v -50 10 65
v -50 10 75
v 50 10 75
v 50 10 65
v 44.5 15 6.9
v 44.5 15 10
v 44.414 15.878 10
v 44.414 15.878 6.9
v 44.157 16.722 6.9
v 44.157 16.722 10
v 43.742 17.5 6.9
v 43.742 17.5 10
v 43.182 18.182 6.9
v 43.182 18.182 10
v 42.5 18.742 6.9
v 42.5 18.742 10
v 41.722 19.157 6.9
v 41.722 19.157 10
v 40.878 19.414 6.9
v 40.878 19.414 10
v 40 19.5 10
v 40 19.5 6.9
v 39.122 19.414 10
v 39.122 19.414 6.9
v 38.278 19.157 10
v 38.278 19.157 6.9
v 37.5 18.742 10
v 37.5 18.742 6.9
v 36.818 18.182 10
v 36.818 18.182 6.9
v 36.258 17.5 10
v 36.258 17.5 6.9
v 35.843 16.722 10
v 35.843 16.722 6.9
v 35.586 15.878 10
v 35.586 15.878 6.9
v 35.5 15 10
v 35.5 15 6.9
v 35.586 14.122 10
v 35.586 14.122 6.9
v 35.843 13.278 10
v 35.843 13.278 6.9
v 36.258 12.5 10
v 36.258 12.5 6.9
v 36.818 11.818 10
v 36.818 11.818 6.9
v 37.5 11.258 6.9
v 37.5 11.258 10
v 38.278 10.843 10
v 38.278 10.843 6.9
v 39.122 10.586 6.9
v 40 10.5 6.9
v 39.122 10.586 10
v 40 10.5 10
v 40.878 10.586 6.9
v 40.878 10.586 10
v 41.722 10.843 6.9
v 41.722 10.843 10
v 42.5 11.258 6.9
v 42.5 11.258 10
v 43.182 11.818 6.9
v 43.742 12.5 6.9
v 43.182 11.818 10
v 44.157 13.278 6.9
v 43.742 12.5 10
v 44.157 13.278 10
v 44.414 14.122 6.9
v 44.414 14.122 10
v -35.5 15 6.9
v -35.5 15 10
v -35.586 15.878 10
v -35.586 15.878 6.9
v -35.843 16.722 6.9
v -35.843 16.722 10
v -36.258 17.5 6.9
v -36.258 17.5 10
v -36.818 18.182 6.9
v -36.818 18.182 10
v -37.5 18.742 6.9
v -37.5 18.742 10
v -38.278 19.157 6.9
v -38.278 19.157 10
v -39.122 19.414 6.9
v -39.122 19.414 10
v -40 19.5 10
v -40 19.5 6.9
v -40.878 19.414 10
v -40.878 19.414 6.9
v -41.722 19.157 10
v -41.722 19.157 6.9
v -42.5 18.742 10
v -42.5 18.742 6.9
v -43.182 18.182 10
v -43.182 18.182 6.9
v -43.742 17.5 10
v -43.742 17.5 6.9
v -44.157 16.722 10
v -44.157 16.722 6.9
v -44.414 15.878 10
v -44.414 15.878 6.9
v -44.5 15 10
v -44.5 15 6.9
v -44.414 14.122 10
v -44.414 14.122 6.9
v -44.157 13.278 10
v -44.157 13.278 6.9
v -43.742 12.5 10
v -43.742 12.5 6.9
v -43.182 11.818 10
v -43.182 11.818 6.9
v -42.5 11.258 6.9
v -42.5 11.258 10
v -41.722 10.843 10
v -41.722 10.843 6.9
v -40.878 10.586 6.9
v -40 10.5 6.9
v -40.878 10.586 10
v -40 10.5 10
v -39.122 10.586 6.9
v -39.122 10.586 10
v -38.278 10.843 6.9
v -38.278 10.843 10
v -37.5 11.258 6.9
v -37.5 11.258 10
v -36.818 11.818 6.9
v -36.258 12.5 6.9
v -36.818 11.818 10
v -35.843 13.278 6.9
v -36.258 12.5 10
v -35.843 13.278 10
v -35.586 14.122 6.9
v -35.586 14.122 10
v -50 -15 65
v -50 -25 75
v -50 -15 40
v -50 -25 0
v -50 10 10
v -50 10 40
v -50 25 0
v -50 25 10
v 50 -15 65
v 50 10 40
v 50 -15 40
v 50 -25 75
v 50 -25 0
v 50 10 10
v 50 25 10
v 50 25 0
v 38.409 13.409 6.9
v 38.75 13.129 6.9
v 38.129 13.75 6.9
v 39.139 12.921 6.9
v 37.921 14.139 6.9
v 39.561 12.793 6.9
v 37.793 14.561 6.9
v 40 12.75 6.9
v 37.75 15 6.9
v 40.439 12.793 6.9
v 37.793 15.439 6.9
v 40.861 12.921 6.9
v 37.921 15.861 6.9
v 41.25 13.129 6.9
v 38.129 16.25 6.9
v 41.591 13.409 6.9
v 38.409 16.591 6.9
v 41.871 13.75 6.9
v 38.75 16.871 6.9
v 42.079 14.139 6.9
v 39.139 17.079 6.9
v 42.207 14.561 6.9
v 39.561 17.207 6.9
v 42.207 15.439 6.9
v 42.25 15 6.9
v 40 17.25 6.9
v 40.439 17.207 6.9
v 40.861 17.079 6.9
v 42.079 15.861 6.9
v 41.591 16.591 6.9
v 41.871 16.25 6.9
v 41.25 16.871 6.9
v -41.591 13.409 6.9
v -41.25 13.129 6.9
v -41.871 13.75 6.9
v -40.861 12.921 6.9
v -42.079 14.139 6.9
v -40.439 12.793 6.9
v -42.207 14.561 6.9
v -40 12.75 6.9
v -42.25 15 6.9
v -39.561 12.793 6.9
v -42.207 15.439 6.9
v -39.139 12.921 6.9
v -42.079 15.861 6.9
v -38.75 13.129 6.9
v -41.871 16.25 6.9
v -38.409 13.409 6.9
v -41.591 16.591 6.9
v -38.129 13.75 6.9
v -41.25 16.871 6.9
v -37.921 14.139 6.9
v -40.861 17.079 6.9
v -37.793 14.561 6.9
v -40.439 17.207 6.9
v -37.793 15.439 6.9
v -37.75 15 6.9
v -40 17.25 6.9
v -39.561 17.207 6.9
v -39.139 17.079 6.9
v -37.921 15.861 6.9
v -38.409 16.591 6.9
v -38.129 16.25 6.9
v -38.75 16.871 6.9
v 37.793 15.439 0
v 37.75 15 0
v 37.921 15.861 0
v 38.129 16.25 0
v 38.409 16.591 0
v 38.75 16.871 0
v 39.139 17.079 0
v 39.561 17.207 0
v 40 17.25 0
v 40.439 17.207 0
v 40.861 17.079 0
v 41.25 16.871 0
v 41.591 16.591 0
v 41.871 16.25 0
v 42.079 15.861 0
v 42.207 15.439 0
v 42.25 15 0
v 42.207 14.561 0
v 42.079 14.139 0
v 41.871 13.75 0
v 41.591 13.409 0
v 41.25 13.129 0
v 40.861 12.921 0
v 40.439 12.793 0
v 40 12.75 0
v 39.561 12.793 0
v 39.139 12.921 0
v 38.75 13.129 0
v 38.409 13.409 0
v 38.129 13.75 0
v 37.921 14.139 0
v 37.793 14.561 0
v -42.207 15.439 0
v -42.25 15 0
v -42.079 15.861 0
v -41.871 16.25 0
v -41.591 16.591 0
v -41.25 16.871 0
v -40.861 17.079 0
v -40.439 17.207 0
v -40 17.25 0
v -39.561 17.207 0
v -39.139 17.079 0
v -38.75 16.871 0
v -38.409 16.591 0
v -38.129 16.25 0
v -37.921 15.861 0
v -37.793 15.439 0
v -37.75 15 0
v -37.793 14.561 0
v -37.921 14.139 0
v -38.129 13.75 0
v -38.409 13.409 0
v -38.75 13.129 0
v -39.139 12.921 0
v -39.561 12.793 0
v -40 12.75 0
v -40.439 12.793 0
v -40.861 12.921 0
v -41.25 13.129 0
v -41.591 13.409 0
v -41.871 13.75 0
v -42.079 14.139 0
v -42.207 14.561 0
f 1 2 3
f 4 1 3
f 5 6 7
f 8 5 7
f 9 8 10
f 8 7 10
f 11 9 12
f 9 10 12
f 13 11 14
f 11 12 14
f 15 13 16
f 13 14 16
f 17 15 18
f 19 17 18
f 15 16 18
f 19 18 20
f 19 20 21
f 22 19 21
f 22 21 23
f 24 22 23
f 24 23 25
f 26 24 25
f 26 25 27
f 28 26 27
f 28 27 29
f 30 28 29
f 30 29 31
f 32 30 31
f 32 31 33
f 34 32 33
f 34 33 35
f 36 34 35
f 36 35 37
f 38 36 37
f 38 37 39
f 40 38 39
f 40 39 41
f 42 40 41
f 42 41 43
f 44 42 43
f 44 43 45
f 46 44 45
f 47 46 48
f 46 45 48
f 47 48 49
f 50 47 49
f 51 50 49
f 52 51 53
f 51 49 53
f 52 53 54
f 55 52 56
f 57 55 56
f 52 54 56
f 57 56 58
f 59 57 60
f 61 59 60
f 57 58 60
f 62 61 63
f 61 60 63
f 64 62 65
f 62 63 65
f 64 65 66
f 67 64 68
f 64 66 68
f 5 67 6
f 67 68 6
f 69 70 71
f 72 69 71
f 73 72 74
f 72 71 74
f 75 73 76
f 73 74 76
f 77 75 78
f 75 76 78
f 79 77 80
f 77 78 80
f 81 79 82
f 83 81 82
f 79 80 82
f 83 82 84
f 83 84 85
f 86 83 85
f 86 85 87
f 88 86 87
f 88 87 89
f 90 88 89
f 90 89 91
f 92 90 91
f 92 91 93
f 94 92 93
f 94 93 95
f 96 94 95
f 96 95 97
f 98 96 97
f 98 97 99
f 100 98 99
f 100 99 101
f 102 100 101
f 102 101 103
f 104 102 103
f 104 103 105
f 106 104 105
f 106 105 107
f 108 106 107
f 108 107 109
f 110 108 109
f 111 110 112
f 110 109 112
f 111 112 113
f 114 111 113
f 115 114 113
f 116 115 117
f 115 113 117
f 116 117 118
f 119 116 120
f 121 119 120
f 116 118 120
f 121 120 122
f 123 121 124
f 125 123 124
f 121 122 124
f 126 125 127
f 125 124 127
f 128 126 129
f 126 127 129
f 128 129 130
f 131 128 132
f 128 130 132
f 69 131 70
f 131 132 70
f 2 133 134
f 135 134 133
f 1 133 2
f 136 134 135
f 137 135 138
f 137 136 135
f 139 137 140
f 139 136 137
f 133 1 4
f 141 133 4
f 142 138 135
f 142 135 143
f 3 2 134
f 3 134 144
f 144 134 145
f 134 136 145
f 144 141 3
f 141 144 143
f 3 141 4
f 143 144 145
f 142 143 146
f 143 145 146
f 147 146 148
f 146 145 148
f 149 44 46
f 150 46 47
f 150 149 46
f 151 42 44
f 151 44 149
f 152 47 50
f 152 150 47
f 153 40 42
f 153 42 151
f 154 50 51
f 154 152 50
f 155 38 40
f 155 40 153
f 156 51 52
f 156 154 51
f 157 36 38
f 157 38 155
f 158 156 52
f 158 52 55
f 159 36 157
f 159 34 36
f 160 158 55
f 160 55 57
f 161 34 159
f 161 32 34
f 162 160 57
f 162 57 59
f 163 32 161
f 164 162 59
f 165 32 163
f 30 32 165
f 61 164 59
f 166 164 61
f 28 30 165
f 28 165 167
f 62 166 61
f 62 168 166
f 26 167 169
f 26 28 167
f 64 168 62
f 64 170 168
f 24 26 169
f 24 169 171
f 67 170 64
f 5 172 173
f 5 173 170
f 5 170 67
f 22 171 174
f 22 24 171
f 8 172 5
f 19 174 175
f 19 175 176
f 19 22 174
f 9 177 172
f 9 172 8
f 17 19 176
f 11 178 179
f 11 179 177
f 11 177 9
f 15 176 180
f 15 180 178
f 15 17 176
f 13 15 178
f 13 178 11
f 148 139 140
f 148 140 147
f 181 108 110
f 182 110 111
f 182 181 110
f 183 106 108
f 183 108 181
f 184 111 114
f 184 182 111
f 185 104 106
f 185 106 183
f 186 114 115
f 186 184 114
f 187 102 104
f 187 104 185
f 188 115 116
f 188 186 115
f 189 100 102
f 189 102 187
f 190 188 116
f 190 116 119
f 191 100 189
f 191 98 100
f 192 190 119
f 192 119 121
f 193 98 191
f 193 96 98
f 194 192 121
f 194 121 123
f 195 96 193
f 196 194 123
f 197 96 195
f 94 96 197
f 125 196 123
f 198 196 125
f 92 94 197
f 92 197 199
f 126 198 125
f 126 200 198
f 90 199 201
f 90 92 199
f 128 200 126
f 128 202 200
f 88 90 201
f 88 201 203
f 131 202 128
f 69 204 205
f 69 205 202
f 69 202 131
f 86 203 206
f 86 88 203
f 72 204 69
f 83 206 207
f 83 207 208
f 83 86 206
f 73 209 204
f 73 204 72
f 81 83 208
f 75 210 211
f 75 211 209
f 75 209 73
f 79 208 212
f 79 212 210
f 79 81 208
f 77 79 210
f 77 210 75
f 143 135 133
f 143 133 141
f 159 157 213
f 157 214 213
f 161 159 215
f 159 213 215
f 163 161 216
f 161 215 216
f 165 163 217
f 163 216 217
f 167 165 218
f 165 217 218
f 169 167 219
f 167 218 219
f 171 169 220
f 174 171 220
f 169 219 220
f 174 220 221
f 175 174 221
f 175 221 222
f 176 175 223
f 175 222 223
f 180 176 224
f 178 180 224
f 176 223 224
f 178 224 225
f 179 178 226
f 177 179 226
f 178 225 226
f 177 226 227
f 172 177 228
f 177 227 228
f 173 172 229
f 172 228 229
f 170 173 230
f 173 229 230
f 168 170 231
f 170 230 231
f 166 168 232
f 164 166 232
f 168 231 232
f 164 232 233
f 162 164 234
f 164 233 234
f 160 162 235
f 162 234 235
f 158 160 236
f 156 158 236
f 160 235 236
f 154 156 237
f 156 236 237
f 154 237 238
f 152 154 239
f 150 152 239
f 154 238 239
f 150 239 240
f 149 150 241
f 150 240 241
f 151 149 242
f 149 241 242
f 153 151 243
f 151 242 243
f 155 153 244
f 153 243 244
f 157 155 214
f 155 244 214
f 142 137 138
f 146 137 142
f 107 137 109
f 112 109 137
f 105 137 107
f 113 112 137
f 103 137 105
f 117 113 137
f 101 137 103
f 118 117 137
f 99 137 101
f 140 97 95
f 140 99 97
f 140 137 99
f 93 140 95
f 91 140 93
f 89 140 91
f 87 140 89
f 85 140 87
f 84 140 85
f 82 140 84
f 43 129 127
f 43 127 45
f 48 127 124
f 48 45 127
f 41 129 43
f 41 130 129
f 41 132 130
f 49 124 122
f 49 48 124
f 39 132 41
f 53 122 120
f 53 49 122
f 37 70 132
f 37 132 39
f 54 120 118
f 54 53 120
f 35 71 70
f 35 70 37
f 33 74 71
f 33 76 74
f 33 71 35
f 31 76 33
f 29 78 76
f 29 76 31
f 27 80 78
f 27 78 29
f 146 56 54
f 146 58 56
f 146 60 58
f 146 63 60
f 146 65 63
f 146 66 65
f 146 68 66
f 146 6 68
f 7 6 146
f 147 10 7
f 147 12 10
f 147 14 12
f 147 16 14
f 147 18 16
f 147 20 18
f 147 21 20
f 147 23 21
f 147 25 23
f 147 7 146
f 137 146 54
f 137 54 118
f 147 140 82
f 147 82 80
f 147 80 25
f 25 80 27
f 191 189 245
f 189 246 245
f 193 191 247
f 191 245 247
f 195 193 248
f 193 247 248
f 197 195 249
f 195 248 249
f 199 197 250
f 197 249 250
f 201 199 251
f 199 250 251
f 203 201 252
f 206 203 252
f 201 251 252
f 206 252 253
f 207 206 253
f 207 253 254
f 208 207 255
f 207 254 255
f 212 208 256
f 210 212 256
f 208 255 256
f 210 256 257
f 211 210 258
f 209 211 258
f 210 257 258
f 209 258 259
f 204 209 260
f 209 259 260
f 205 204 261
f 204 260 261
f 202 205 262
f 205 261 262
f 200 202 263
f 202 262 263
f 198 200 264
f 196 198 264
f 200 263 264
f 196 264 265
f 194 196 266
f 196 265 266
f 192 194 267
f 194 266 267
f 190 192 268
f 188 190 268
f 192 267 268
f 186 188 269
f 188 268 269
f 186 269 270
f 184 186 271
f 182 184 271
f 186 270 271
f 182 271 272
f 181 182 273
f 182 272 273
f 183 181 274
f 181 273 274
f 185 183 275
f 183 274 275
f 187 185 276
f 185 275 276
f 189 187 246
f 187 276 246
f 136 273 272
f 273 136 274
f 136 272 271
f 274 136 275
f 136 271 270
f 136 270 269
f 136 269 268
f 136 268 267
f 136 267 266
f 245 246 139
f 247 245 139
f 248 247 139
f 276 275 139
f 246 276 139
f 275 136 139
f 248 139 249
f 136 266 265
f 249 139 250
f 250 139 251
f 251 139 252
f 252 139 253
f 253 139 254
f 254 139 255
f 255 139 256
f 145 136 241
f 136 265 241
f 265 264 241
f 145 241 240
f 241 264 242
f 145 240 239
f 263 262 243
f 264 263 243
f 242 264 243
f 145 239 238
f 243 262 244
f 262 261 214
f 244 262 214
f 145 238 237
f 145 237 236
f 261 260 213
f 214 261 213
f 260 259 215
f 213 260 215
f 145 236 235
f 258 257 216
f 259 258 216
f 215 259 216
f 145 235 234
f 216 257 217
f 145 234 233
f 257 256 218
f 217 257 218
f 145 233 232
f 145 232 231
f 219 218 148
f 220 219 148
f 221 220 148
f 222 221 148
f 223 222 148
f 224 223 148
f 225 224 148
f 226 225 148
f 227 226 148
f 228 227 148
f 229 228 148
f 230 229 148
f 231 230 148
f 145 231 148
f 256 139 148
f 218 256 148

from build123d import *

# Parameters (mm, degrees)
CROQUIS1_W                                           = 100
CROQUIS1_H                                           = 50
SALIENTE_EXTRUIR1_DEPTH                              = 10
CROQUIS2_W                                           = 100
CROQUIS2_H                                           = 10
SALIENTE_EXTRUIR2_DEPTH                              = 75
CROQUIS3_W                                           = 100
CROQUIS3_H                                           = 35
SALIENTE_EXTRUIR3_DEPTH                              = 10
REFRENTADO_PARA_TORNILLO_CON_CABEZA_TRON_D           = 4.5
REFRENTADO_PARA_TORNILLO_CON_CABEZA_TRON_CBORE_D     = 9
REFRENTADO_PARA_TORNILLO_CON_CABEZA_TRON_CBORE_DEPTH = 3.1
CROQUIS11_W                                          = 100
CROQUIS11_H                                          = 35
SALIENTE_EXTRUIR4_DEPTH                              = 30


with BuildPart() as part:
    # Croquis1 → Saliente-Extruir1 (new body)
    with BuildSketch(Plane.XY):
        Rectangle(CROQUIS1_W, CROQUIS1_H)
    extrude(amount=SALIENTE_EXTRUIR1_DEPTH)

    # Croquis2 → Saliente-Extruir2 (add)
    with BuildSketch(Plane.XY):
        with Locations((0, -20)):
            Rectangle(CROQUIS2_W, CROQUIS2_H)
    extrude(amount=SALIENTE_EXTRUIR2_DEPTH)

    # Croquis3 → Saliente-Extruir3 (add)
    with BuildSketch(Plane.XY.offset(75)):
        with Locations((0, -7.5)):
            Rectangle(CROQUIS3_W, CROQUIS3_H)
    extrude(amount=-SALIENTE_EXTRUIR3_DEPTH)

    # Refrentado para tornillo con cabeza troncocónica de M43 (through all)
    with Locations(Plane(origin=(-40, 15, 10), x_dir=(1, 0, 0), z_dir=(0, 0, 1))):
        with Locations((0, 0), (80, 0)):
            CounterBoreHole(REFRENTADO_PARA_TORNILLO_CON_CABEZA_TRON_D / 2, REFRENTADO_PARA_TORNILLO_CON_CABEZA_TRON_CBORE_D / 2, REFRENTADO_PARA_TORNILLO_CON_CABEZA_TRON_CBORE_DEPTH)

    # Croquis11 → Saliente-Extruir4 (add)
    with BuildSketch(Plane.XY.offset(10)):
        with Locations((0, -7.5)):
            Rectangle(CROQUIS11_W, CROQUIS11_H)
    extrude(amount=SALIENTE_EXTRUIR4_DEPTH)


solid = part.part
